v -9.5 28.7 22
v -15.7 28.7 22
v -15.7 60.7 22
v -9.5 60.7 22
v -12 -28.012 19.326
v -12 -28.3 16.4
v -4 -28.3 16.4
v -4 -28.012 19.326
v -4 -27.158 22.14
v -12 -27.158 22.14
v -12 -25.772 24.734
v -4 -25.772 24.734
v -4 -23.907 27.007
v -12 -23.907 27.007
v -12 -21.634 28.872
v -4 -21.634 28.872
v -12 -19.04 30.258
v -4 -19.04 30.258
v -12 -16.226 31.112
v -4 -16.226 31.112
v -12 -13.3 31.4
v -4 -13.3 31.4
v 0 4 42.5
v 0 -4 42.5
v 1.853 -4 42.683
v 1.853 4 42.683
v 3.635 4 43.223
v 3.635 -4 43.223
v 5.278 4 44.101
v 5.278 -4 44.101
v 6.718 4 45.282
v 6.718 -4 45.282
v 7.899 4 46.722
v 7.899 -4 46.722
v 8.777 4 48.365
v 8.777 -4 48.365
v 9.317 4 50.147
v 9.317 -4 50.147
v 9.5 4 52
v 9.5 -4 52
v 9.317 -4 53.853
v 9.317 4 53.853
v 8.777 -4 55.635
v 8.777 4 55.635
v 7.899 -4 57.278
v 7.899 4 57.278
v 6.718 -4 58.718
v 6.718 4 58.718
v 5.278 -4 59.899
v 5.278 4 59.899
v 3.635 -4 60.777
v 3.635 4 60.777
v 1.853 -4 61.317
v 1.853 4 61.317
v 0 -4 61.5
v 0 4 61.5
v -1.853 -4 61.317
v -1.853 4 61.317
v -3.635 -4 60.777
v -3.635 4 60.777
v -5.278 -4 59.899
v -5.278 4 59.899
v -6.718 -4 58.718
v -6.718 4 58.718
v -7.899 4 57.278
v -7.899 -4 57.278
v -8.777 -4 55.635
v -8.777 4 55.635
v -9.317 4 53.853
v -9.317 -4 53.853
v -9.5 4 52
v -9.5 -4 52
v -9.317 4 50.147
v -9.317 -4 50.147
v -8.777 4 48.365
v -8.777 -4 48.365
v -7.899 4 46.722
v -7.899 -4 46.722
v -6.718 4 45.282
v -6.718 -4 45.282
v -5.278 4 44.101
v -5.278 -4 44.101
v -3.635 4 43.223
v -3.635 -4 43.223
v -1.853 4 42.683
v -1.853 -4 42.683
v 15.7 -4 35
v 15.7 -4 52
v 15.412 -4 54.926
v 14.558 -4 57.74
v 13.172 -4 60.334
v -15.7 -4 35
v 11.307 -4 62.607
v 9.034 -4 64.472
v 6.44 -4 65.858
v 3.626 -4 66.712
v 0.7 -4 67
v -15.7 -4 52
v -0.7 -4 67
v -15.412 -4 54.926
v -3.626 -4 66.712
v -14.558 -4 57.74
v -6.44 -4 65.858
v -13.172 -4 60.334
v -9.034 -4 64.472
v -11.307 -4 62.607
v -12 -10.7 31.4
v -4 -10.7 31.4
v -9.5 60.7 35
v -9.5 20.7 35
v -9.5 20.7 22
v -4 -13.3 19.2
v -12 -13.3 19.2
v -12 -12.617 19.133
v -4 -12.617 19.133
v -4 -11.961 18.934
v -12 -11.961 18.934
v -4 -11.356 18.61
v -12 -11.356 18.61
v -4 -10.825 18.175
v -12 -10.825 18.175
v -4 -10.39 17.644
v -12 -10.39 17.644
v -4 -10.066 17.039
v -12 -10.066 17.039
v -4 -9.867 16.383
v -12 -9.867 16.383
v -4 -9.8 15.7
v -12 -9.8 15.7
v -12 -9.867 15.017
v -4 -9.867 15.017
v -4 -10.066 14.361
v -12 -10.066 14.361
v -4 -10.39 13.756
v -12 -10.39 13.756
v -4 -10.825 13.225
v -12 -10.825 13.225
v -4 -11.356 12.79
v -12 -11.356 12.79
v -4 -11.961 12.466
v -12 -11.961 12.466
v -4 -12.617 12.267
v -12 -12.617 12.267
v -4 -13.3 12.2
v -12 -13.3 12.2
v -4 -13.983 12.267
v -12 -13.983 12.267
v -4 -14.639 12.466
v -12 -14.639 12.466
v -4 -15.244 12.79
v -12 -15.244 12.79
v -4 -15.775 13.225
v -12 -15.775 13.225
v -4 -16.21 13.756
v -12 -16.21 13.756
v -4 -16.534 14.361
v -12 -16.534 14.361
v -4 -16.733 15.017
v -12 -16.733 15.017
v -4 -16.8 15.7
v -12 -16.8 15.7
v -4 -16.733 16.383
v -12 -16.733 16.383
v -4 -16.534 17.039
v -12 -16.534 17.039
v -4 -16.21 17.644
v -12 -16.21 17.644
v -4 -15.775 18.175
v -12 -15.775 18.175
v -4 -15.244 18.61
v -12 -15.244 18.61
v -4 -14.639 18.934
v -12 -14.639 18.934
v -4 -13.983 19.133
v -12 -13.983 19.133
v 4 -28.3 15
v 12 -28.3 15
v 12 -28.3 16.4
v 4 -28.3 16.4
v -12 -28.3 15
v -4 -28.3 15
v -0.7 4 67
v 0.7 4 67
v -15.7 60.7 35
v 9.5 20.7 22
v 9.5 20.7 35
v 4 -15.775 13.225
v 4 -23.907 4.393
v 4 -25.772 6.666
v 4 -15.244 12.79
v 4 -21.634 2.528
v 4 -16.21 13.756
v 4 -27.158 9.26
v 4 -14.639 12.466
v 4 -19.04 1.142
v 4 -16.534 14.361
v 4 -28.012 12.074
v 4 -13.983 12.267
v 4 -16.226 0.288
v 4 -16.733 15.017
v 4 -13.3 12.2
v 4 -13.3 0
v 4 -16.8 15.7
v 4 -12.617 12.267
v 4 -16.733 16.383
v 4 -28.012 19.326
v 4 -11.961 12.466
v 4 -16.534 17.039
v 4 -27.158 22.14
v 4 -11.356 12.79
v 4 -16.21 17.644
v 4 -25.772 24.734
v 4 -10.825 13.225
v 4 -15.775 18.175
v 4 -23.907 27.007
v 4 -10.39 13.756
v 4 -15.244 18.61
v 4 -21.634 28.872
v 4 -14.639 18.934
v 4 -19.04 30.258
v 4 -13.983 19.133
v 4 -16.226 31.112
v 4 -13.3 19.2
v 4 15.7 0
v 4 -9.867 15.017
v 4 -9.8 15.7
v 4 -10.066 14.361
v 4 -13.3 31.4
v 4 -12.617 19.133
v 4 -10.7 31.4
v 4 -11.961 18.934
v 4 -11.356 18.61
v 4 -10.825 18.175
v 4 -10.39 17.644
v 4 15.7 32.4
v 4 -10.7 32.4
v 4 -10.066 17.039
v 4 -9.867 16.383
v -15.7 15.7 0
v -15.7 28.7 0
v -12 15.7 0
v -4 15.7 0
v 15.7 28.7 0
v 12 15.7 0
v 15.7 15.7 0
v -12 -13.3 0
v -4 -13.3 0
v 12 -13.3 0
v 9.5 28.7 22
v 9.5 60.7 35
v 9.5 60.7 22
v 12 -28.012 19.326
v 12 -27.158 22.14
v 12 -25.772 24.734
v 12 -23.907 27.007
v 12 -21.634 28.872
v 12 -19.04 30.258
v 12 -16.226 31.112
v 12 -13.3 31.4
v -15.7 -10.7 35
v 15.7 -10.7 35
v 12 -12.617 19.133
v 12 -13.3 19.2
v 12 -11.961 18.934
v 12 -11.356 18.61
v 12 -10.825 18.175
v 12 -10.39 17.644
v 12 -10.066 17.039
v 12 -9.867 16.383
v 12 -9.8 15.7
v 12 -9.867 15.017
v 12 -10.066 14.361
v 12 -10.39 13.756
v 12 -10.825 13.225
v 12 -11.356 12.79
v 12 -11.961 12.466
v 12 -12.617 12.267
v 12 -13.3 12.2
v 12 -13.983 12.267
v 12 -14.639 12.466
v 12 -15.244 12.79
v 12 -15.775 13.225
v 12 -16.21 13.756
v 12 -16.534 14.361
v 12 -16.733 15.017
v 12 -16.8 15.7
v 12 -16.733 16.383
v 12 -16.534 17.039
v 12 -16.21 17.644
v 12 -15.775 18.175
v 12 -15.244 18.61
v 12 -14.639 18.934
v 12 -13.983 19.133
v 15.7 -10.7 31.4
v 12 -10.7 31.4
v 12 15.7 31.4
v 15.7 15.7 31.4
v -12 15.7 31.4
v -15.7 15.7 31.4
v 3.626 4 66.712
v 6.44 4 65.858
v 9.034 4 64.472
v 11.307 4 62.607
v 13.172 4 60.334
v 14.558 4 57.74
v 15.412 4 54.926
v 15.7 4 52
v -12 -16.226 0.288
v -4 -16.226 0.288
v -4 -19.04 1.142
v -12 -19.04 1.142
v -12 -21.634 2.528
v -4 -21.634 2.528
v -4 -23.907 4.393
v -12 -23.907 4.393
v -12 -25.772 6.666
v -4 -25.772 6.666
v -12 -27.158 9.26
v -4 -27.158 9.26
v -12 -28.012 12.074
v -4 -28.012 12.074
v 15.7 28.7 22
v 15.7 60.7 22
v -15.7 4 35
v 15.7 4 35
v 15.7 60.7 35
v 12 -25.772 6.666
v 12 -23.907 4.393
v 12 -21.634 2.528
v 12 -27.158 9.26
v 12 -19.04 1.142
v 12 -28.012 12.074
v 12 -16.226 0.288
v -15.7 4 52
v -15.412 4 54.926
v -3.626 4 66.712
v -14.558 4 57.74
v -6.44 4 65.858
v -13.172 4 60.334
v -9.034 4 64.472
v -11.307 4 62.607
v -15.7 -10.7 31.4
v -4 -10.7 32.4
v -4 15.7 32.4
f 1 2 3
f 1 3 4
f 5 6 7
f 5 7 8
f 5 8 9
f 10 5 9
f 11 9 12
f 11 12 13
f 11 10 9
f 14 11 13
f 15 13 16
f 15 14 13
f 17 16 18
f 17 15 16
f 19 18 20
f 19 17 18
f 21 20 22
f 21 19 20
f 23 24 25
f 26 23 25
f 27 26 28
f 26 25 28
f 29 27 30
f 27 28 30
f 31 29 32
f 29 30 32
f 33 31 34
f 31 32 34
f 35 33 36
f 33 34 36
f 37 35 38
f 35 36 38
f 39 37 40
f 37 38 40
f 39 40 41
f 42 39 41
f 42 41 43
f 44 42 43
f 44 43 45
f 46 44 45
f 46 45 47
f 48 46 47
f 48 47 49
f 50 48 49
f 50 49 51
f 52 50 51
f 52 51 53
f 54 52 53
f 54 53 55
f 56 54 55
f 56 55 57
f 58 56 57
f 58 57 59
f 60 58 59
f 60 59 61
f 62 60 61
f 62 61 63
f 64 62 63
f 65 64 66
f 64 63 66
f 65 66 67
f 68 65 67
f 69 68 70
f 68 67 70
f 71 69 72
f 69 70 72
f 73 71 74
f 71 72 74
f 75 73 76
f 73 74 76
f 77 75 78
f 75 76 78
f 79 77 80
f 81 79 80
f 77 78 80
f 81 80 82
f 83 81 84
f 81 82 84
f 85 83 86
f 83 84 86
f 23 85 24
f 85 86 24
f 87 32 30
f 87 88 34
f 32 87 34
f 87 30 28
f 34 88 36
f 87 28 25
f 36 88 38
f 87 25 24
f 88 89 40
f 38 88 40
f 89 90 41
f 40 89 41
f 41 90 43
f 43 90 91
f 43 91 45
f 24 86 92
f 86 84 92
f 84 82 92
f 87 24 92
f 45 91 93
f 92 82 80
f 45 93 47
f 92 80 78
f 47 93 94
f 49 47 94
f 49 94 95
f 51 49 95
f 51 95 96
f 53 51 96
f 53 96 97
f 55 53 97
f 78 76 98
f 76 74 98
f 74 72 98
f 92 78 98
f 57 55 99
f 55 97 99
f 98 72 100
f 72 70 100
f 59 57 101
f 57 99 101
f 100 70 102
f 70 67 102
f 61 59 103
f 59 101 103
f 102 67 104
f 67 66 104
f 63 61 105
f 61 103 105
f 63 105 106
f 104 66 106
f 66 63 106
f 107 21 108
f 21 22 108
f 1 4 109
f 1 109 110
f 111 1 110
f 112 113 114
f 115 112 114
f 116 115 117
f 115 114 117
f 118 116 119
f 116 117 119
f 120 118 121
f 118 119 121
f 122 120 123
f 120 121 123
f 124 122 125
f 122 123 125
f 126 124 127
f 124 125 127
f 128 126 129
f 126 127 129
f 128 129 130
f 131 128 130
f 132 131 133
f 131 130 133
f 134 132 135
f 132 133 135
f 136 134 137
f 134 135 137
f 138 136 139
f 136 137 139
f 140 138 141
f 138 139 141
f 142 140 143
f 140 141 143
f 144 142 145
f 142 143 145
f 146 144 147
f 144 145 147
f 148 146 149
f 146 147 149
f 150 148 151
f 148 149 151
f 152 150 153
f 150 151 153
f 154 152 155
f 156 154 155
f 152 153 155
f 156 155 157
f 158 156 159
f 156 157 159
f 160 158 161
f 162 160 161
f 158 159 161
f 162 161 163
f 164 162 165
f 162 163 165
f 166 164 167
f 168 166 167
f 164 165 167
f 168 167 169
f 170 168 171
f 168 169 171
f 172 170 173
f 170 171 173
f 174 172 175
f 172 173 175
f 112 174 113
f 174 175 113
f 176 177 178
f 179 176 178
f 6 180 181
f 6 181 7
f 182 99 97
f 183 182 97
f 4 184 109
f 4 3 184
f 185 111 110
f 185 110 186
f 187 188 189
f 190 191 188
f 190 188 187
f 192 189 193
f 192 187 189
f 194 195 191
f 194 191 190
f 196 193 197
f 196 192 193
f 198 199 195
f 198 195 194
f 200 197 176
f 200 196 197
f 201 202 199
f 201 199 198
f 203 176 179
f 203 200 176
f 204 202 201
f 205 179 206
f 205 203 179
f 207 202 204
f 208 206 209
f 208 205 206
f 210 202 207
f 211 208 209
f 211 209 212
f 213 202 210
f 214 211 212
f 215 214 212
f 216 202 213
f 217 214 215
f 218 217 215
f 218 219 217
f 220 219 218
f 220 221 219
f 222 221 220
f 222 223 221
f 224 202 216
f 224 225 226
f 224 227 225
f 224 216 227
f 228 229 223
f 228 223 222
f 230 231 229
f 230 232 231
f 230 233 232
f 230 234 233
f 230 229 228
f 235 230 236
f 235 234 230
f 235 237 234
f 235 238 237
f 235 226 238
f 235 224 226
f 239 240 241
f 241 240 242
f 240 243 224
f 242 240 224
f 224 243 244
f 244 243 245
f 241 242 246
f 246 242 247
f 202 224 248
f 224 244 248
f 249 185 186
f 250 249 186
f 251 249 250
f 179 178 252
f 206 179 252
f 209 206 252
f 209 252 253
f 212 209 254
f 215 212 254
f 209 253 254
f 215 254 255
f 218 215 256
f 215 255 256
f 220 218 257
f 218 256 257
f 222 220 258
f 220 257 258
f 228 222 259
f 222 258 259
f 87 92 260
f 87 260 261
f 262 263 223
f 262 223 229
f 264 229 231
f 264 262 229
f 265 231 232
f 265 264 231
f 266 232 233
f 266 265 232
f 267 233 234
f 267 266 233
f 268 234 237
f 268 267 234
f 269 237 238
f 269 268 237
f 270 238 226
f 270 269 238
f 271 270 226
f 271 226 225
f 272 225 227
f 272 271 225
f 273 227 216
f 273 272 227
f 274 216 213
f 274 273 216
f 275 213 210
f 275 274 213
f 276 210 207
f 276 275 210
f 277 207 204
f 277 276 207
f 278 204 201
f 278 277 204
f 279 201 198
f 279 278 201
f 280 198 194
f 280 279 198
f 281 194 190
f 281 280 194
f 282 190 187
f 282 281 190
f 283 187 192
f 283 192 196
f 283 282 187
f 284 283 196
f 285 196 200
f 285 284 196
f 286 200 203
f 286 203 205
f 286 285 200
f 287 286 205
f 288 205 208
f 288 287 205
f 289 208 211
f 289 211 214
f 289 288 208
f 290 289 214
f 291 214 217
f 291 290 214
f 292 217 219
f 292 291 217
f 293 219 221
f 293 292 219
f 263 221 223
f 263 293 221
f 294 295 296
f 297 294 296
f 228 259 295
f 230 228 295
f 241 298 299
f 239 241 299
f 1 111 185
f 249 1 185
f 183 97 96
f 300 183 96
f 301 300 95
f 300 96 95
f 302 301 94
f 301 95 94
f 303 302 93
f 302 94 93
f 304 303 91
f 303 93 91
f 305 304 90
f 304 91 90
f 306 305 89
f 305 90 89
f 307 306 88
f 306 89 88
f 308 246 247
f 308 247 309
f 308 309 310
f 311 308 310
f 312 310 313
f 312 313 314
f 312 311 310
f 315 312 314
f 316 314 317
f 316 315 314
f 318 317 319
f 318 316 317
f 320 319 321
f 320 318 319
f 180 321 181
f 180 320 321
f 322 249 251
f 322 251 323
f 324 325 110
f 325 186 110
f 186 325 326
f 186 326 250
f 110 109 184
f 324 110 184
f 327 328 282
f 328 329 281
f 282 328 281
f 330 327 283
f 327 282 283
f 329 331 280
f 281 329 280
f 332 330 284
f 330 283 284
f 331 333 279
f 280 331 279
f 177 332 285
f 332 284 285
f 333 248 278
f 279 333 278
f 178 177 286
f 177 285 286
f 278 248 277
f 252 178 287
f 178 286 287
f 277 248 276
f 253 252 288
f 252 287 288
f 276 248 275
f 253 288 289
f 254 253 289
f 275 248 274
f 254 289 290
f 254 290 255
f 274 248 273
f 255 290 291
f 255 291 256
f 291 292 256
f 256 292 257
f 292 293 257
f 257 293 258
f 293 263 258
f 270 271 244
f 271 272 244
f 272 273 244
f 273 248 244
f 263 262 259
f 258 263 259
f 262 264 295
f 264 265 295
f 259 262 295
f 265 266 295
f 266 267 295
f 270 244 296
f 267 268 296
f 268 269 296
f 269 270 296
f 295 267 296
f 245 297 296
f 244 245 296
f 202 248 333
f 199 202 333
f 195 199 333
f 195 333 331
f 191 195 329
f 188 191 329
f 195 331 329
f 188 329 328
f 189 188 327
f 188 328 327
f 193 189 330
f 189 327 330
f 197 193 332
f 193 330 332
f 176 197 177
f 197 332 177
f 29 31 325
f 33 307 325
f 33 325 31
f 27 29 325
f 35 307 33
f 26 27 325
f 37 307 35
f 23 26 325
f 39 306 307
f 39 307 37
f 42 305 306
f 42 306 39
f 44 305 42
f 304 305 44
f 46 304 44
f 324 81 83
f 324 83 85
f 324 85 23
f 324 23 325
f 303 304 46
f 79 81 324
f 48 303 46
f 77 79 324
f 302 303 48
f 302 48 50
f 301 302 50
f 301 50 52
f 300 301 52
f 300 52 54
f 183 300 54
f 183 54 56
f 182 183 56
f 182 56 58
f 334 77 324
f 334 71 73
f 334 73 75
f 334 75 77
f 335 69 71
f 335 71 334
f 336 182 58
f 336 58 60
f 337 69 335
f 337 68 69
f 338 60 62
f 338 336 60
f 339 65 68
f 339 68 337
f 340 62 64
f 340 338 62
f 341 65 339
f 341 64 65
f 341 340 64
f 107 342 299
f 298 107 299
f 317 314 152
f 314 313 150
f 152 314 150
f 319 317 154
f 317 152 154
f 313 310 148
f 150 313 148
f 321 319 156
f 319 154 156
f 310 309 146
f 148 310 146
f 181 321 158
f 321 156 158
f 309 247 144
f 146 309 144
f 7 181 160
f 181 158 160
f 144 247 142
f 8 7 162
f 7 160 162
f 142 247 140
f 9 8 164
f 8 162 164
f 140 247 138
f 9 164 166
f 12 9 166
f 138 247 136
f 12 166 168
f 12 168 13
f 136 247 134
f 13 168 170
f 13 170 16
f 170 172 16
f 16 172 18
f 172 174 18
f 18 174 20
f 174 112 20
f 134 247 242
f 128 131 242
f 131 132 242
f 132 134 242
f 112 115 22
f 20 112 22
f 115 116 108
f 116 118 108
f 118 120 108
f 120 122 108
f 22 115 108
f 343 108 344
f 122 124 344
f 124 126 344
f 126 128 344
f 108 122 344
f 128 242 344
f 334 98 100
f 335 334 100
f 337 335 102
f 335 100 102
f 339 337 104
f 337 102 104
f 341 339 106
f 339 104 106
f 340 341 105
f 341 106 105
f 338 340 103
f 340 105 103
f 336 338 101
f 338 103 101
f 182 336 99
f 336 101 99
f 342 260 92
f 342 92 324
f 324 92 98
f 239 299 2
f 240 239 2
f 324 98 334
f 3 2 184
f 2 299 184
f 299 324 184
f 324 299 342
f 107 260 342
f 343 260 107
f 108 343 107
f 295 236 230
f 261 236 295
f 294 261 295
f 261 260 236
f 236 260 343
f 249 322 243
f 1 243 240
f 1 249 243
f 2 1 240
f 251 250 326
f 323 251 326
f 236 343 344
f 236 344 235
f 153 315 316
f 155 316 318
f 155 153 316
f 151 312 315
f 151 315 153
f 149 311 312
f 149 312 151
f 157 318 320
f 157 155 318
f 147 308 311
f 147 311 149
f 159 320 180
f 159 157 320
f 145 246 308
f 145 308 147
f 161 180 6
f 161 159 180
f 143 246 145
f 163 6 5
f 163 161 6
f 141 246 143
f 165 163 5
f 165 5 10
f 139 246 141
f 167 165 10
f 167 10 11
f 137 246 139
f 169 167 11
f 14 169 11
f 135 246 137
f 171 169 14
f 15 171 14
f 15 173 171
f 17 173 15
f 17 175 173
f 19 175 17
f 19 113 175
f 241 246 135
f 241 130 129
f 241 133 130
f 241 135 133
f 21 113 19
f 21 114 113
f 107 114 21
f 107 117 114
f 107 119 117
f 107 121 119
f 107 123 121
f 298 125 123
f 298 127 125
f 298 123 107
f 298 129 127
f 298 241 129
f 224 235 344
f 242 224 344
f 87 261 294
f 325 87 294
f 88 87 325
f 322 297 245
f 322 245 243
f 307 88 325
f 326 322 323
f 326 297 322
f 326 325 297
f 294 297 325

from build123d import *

# Parameters (mm, degrees)
SKETCH4_W            = 31.4
SKETCH4_H            = 31.4
SKETCH4_W_2          = 25.4
SKETCH4_H_2          = 25.4
BOSS_EXTRUDE3_DEPTH  = 30
SKETCH5_W            = 31.4
SKETCH5_H            = 31.4
BOSS_EXTRUDE4_DEPTH  = 5
SKETCH6_W            = 31.4
SKETCH6_H            = 8
BOSS_EXTRUDE5_DEPTH  = 5
BOSS_EXTRUDE6_DEPTH  = 8
SKETCH8_R            = 9.5
BOSS_EXTRUDE7_DEPTH  = 8
SKETCH9_W            = 31.4
SKETCH9_H            = 10
BOSS_EXTRUDE8_DEPTH  = 5
SKETCH10_W           = 31.4
SKETCH10_H           = 10
BOSS_EXTRUDE9_DEPTH  = 13
SKETCH11_W           = 6.2
SKETCH11_H           = 10
BOSS_EXTRUDE10_DEPTH = 40
BOSS_EXTRUDE11_DEPTH = 3
SKETCH13_W           = 31.4
SKETCH13_H           = 31.4
CUT_EXTRUDE1_DEPTH   = 31.4
SKETCH15_W           = 31.4
SKETCH15_H           = 13
BOSS_EXTRUDE12_DEPTH = 12
SKETCH17_W           = 8
SKETCH17_H           = 31.4
BOSS_EXTRUDE13_DEPTH = 10
SKETCH18_R           = 3.5
BOSS_EXTRUDE14_DEPTH = 8
SKETCH19_W           = 3.6
SKETCH19_H           = 5
CUT_EXTRUDE2_DEPTH   = 31.4
CUT_EXTRUDE3_START   = 8
SKETCH8_2_R          = 9.5
CUT_EXTRUDE3_DEPTH   = 24
SKETCH20_W           = 8
SKETCH20_H           = 1
CUT_EXTRUDE4_DEPTH   = 26.4


with BuildPart() as part:
    # Sketch4 → Boss-Extrude3 (new body)
    with BuildSketch(Plane.XY):
        Rectangle(SKETCH4_W, SKETCH4_H)
        Rectangle(SKETCH4_W_2, SKETCH4_H_2, mode=Mode.SUBTRACT)
    extrude(amount=BOSS_EXTRUDE3_DEPTH)

    # Sketch5 → Boss-Extrude4 (add)
    with BuildSketch(Plane.XY.offset(30)):
        Rectangle(SKETCH5_W, SKETCH5_H)
    extrude(amount=BOSS_EXTRUDE4_DEPTH)

    # Sketch6 → Boss-Extrude5 (add)
    with BuildSketch(Plane.XY.offset(35)):
        Rectangle(SKETCH6_W, SKETCH6_H)
    extrude(amount=BOSS_EXTRUDE5_DEPTH)

    # Sketch7 → Boss-Extrude6 (add)
    with BuildSketch(Plane.XZ.offset(4)):
        with BuildLine():
            Line((-15.7, 40), (-15.7, 52))
            ThreePointArc((-15.7, 52), (-11.306601718, 62.606601718), (-0.7, 67))
            Line((-0.7, 67), (0.7, 67))
            ThreePointArc((0.7, 67), (11.306601718, 62.606601718), (15.7, 52))
            Line((15.7, 52), (15.7, 40))
            Line((15.7, 40), (-15.7, 40))
        make_face()
    extrude(amount=-BOSS_EXTRUDE6_DEPTH)

    # Sketch8 → Boss-Extrude7 (add)
    with BuildSketch(Plane.XZ.offset(4)):
        with Locations((0, 52)):
            Circle(SKETCH8_R)
    boss_extrude7 = extrude(amount=BOSS_EXTRUDE7_DEPTH)

    # Mirror1: Boss-Extrude7 across plane
    add(boss_extrude7.mirror(Plane.ZX))

    # Sketch9 → Boss-Extrude8 (add)
    with BuildSketch(Plane(origin=(0, 15.7, 0), x_dir=(1, 0, 0), z_dir=(0, 1, 0))):
        with Locations((0, -27)):
            Rectangle(SKETCH9_W, SKETCH9_H)
    extrude(amount=BOSS_EXTRUDE8_DEPTH)

    # Sketch10 → Boss-Extrude9 (add)
    with BuildSketch(Plane(origin=(0, 15.7, 0), x_dir=(1, 0, 0), z_dir=(0, 1, 0))):
        with Locations((0, -17)):
            Rectangle(SKETCH10_W, SKETCH10_H)
    extrude(amount=BOSS_EXTRUDE9_DEPTH)

    # Sketch11 → Boss-Extrude10 (add)
    with BuildSketch(Plane(origin=(0, 20.7, 0), x_dir=(1, 0, 0), z_dir=(0, 1, 0))):
        with Locations((-12.6, -27)):
            Rectangle(SKETCH11_W, SKETCH11_H)
        with Locations((12.6, -27)):
            Rectangle(SKETCH11_W, SKETCH11_H)
    extrude(amount=BOSS_EXTRUDE10_DEPTH)

    # Sketch12 → Boss-Extrude11 (add)
    with BuildSketch(Plane.XY.offset(32)):
        Polygon((-15.7, 60.7), (-9.5, 60.7), (-9.5, 20.7), (9.5, 20.7), (9.5, 60.7), (15.7, 60.7), (15.7, 15.7), (-15.7, 15.7), align=None)
    extrude(amount=BOSS_EXTRUDE11_DEPTH)

    # Sketch13 → Cut-Extrude1 (cut)
    with BuildSketch(Plane.ZY.offset(15.7)):
        with Locations((15.7, 0)):
            Rectangle(SKETCH13_W, SKETCH13_H)
    extrude(amount=-CUT_EXTRUDE1_DEPTH, mode=Mode.SUBTRACT)

    # Sketch15 → Boss-Extrude12 (add)
    with BuildSketch(Plane(origin=(0, 0, 12), x_dir=(-1, 0, 0), z_dir=(0, 0, -1))):
        with Locations((0, 22.2)):
            Rectangle(SKETCH15_W, SKETCH15_H)
    extrude(amount=BOSS_EXTRUDE12_DEPTH)

    # Sketch17 → Boss-Extrude13 (add)
    with BuildSketch(Plane.XZ.offset(-15.7)):
        with Locations((-8, 15.7)):
            Rectangle(SKETCH17_W, SKETCH17_H)
    boss_extrude13 = extrude(amount=BOSS_EXTRUDE13_DEPTH)

    # Sketch18 → Boss-Extrude14 (add)
    with BuildSketch(Plane.ZY.offset(12)):
        with BuildLine():
            Line((31.4, 5.7), (0, 5.7))
            Line((0, 5.7), (0, -13.3))
            ThreePointArc((0, -13.3), (4.393398282, -23.906601718), (15, -28.3))
            Line((15, -28.3), (16.4, -28.3))
            ThreePointArc((16.4, -28.3), (27.006601718, -23.906601718), (31.4, -13.3))
            Line((31.4, -13.3), (31.4, 5.7))
        make_face()
        with Locations((15.7, -13.3)):
            Circle(SKETCH18_R, mode=Mode.SUBTRACT)
    boss_extrude14 = extrude(amount=-BOSS_EXTRUDE14_DEPTH)

    # Mirror3: Boss-Extrude13, Boss-Extrude14 across plane
    add(boss_extrude13.mirror(Plane(origin=(0, 0, 0), x_dir=(0, 0, 1), z_dir=(1, 0, 0))))
    add(boss_extrude14.mirror(Plane(origin=(0, 0, 0), x_dir=(0, 0, 1), z_dir=(1, 0, 0))))

    # Sketch19 → Cut-Extrude2 (cut)
    with BuildSketch(Plane(origin=(15.7, 0, 0), x_dir=(0, 0, -1), z_dir=(1, 0, 0))):
        with Locations((-33.2, -13.2)):
            Rectangle(SKETCH19_W, SKETCH19_H)
    extrude(amount=-CUT_EXTRUDE2_DEPTH, mode=Mode.SUBTRACT)

    # Sketch8<2> → Cut-Extrude3 (cut)
    with BuildSketch(Plane.XZ.offset(4).offset(CUT_EXTRUDE3_START)):
        with Locations((0, 52)):
            Circle(SKETCH8_2_R)
    extrude(amount=-CUT_EXTRUDE3_DEPTH, mode=Mode.SUBTRACT)

    # Sketch20 → Cut-Extrude4 (cut)
    with BuildSketch(Plane.XZ.offset(10.7)):
        with Locations((0, 31.9)):
            Rectangle(SKETCH20_W, SKETCH20_H)
    extrude(amount=-CUT_EXTRUDE4_DEPTH, mode=Mode.SUBTRACT)


solid = part.part
